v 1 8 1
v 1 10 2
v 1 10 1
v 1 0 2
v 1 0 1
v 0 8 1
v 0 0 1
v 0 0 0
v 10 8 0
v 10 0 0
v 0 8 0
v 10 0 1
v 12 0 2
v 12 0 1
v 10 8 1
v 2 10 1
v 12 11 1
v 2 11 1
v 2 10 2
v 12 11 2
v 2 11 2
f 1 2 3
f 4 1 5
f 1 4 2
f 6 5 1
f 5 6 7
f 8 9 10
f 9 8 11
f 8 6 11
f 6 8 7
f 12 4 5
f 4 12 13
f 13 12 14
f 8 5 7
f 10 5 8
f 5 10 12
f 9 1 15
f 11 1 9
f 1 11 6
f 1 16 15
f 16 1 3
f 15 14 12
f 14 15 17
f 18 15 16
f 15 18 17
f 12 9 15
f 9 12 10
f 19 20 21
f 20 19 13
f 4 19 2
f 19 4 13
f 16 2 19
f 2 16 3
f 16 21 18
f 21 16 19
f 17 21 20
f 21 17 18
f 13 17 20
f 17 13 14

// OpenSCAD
union() {
    translate([0, 0, 0]) cube([1, 1, 1]);
    translate([0, 1, 0]) cube([1, 1, 1]);
    translate([0, 2, 0]) cube([1, 1, 1]);
    translate([0, 3, 0]) cube([1, 1, 1]);
    translate([0, 4, 0]) cube([1, 1, 1]);
    translate([0, 5, 0]) cube([1, 1, 1]);
    translate([0, 6, 0]) cube([1, 1, 1]);
    translate([0, 7, 0]) cube([1, 1, 1]);
    translate([1, 0, 0]) cube([1, 1, 1]);
    translate([1, 1, 0]) cube([1, 1, 1]);
    translate([1, 2, 0]) cube([1, 1, 1]);
    translate([1, 3, 0]) cube([1, 1, 1]);
    translate([1, 4, 0]) cube([1, 1, 1]);
    translate([1, 5, 0]) cube([1, 1, 1]);
    translate([1, 6, 0]) cube([1, 1, 1]);
    translate([1, 7, 0]) cube([1, 1, 1]);
    translate([2, 0, 0]) cube([1, 1, 1]);
    translate([2, 1, 0]) cube([1, 1, 1]);
    translate([2, 2, 0]) cube([1, 1, 1]);
    translate([2, 3, 0]) cube([1, 1, 1]);
    translate([2, 4, 0]) cube([1, 1, 1]);
    translate([2, 5, 0]) cube([1, 1, 1]);
    translate([2, 6, 0]) cube([1, 1, 1]);
    translate([2, 7, 0]) cube([1, 1, 1]);
    translate([3, 0, 0]) cube([1, 1, 1]);
    translate([3, 1, 0]) cube([1, 1, 1]);
    translate([3, 2, 0]) cube([1, 1, 1]);
    translate([3, 3, 0]) cube([1, 1, 1]);
    translate([3, 4, 0]) cube([1, 1, 1]);
    translate([3, 5, 0]) cube([1, 1, 1]);
    translate([3, 6, 0]) cube([1, 1, 1]);
    translate([3, 7, 0]) cube([1, 1, 1]);
    translate([4, 0, 0]) cube([1, 1, 1]);
    translate([4, 1, 0]) cube([1, 1, 1]);
    translate([4, 2, 0]) cube([1, 1, 1]);
    translate([4, 3, 0]) cube([1, 1, 1]);
    translate([4, 4, 0]) cube([1, 1, 1]);
    translate([4, 5, 0]) cube([1, 1, 1]);
    translate([4, 6, 0]) cube([1, 1, 1]);
    translate([4, 7, 0]) cube([1, 1, 1]);
    translate([5, 0, 0]) cube([1, 1, 1]);
    translate([5, 1, 0]) cube([1, 1, 1]);
    translate([5, 2, 0]) cube([1, 1, 1]);
    translate([5, 3, 0]) cube([1, 1, 1]);
    translate([5, 4, 0]) cube([1, 1, 1]);
    translate([5, 5, 0]) cube([1, 1, 1]);
    translate([5, 6, 0]) cube([1, 1, 1]);
    translate([5, 7, 0]) cube([1, 1, 1]);
    translate([6, 0, 0]) cube([1, 1, 1]);
    translate([6, 1, 0]) cube([1, 1, 1]);
    translate([6, 2, 0]) cube([1, 1, 1]);
    translate([6, 3, 0]) cube([1, 1, 1]);
    translate([6, 4, 0]) cube([1, 1, 1]);
    translate([6, 5, 0]) cube([1, 1, 1]);
    translate([6, 6, 0]) cube([1, 1, 1]);
    translate([6, 7, 0]) cube([1, 1, 1]);
    translate([7, 0, 0]) cube([1, 1, 1]);
    translate([7, 1, 0]) cube([1, 1, 1]);
    translate([7, 2, 0]) cube([1, 1, 1]);
    translate([7, 3, 0]) cube([1, 1, 1]);
    translate([7, 4, 0]) cube([1, 1, 1]);
    translate([7, 5, 0]) cube([1, 1, 1]);
    translate([7, 6, 0]) cube([1, 1, 1]);
    translate([7, 7, 0]) cube([1, 1, 1]);
    translate([8, 0, 0]) cube([1, 1, 1]);
    translate([8, 1, 0]) cube([1, 1, 1]);
    translate([8, 2, 0]) cube([1, 1, 1]);
    translate([8, 3, 0]) cube([1, 1, 1]);
    translate([8, 4, 0]) cube([1, 1, 1]);
    translate([8, 5, 0]) cube([1, 1, 1]);
    translate([8, 6, 0]) cube([1, 1, 1]);
    translate([8, 7, 0]) cube([1, 1, 1]);
    translate([9, 0, 0]) cube([1, 1, 1]);
    translate([9, 1, 0]) cube([1, 1, 1]);
    translate([9, 2, 0]) cube([1, 1, 1]);
    translate([9, 3, 0]) cube([1, 1, 1]);
    translate([9, 4, 0]) cube([1, 1, 1]);
    translate([9, 5, 0]) cube([1, 1, 1]);
    translate([9, 6, 0]) cube([1, 1, 1]);
    translate([9, 7, 0]) cube([1, 1, 1]);
    translate([1, 0, 1]) cube([1, 1, 1]);
    translate([1, 1, 1]) cube([1, 1, 1]);
    translate([1, 2, 1]) cube([1, 1, 1]);
    translate([1, 3, 1]) cube([1, 1, 1]);
    translate([1, 4, 1]) cube([1, 1, 1]);
    translate([1, 5, 1]) cube([1, 1, 1]);
    translate([1, 6, 1]) cube([1, 1, 1]);
    translate([1, 7, 1]) cube([1, 1, 1]);
    translate([1, 8, 1]) cube([1, 1, 1]);
    translate([1, 9, 1]) cube([1, 1, 1]);
    translate([2, 0, 1]) cube([1, 1, 1]);
    translate([2, 1, 1]) cube([1, 1, 1]);
    translate([2, 2, 1]) cube([1, 1, 1]);
    translate([2, 3, 1]) cube([1, 1, 1]);
    translate([2, 4, 1]) cube([1, 1, 1]);
    translate([2, 5, 1]) cube([1, 1, 1]);
    translate([2, 6, 1]) cube([1, 1, 1]);
    translate([2, 7, 1]) cube([1, 1, 1]);
    translate([2, 8, 1]) cube([1, 1, 1]);
    translate([2, 9, 1]) cube([1, 1, 1]);
    translate([2, 10, 1]) cube([1, 1, 1]);
    translate([3, 0, 1]) cube([1, 1, 1]);
    translate([3, 1, 1]) cube([1, 1, 1]);
    translate([3, 2, 1]) cube([1, 1, 1]);
    translate([3, 3, 1]) cube([1, 1, 1]);
    translate([3, 4, 1]) cube([1, 1, 1]);
    translate([3, 5, 1]) cube([1, 1, 1]);
    translate([3, 6, 1]) cube([1, 1, 1]);
    translate([3, 7, 1]) cube([1, 1, 1]);
    translate([3, 8, 1]) cube([1, 1, 1]);
    translate([3, 9, 1]) cube([1, 1, 1]);
    translate([3, 10, 1]) cube([1, 1, 1]);
    translate([4, 0, 1]) cube([1, 1, 1]);
    translate([4, 1, 1]) cube([1, 1, 1]);
    translate([4, 2, 1]) cube([1, 1, 1]);
    translate([4, 3, 1]) cube([1, 1, 1]);
    translate([4, 4, 1]) cube([1, 1, 1]);
    translate([4, 5, 1]) cube([1, 1, 1]);
    translate([4, 6, 1]) cube([1, 1, 1]);
    translate([4, 7, 1]) cube([1, 1, 1]);
    translate([4, 8, 1]) cube([1, 1, 1]);
    translate([4, 9, 1]) cube([1, 1, 1]);
    translate([4, 10, 1]) cube([1, 1, 1]);
    translate([5, 0, 1]) cube([1, 1, 1]);
    translate([5, 1, 1]) cube([1, 1, 1]);
    translate([5, 2, 1]) cube([1, 1, 1]);
    translate([5, 3, 1]) cube([1, 1, 1]);
    translate([5, 4, 1]) cube([1, 1, 1]);
    translate([5, 5, 1]) cube([1, 1, 1]);
    translate([5, 6, 1]) cube([1, 1, 1]);
    translate([5, 7, 1]) cube([1, 1, 1]);
    translate([5, 8, 1]) cube([1, 1, 1]);
    translate([5, 9, 1]) cube([1, 1, 1]);
    translate([5, 10, 1]) cube([1, 1, 1]);
    translate([6, 0, 1]) cube([1, 1, 1]);
    translate([6, 1, 1]) cube([1, 1, 1]);
    translate([6, 2, 1]) cube([1, 1, 1]);
    translate([6, 3, 1]) cube([1, 1, 1]);
    translate([6, 4, 1]) cube([1, 1, 1]);
    translate([6, 5, 1]) cube([1, 1, 1]);
    translate([6, 6, 1]) cube([1, 1, 1]);
    translate([6, 7, 1]) cube([1, 1, 1]);
    translate([6, 8, 1]) cube([1, 1, 1]);
    translate([6, 9, 1]) cube([1, 1, 1]);
    translate([6, 10, 1]) cube([1, 1, 1]);
    translate([7, 0, 1]) cube([1, 1, 1]);
    translate([7, 1, 1]) cube([1, 1, 1]);
    translate([7, 2, 1]) cube([1, 1, 1]);
    translate([7, 3, 1]) cube([1, 1, 1]);
    translate([7, 4, 1]) cube([1, 1, 1]);
    translate([7, 5, 1]) cube([1, 1, 1]);
    translate([7, 6, 1]) cube([1, 1, 1]);
    translate([7, 7, 1]) cube([1, 1, 1]);
    translate([7, 8, 1]) cube([1, 1, 1]);
    translate([7, 9, 1]) cube([1, 1, 1]);
    translate([7, 10, 1]) cube([1, 1, 1]);
    translate([8, 0, 1]) cube([1, 1, 1]);
    translate([8, 1, 1]) cube([1, 1, 1]);
    translate([8, 2, 1]) cube([1, 1, 1]);
    translate([8, 3, 1]) cube([1, 1, 1]);
    translate([8, 4, 1]) cube([1, 1, 1]);
    translate([8, 5, 1]) cube([1, 1, 1]);
    translate([8, 6, 1]) cube([1, 1, 1]);
    translate([8, 7, 1]) cube([1, 1, 1]);
    translate([8, 8, 1]) cube([1, 1, 1]);
    translate([8, 9, 1]) cube([1, 1, 1]);
    translate([8, 10, 1]) cube([1, 1, 1]);
    translate([9, 0, 1]) cube([1, 1, 1]);
    translate([9, 1, 1]) cube([1, 1, 1]);
    translate([9, 2, 1]) cube([1, 1, 1]);
    translate([9, 3, 1]) cube([1, 1, 1]);
    translate([9, 4, 1]) cube([1, 1, 1]);
    translate([9, 5, 1]) cube([1, 1, 1]);
    translate([9, 6, 1]) cube([1, 1, 1]);
    translate([9, 7, 1]) cube([1, 1, 1]);
    translate([9, 8, 1]) cube([1, 1, 1]);
    translate([9, 9, 1]) cube([1, 1, 1]);
    translate([9, 10, 1]) cube([1, 1, 1]);
    translate([10, 0, 1]) cube([1, 1, 1]);
    translate([10, 1, 1]) cube([1, 1, 1]);
    translate([10, 2, 1]) cube([1, 1, 1]);
    translate([10, 3, 1]) cube([1, 1, 1]);
    translate([10, 4, 1]) cube([1, 1, 1]);
    translate([10, 5, 1]) cube([1, 1, 1]);
    translate([10, 6, 1]) cube([1, 1, 1]);
    translate([10, 7, 1]) cube([1, 1, 1]);
    translate([10, 8, 1]) cube([1, 1, 1]);
    translate([10, 9, 1]) cube([1, 1, 1]);
    translate([10, 10, 1]) cube([1, 1, 1]);
    translate([11, 0, 1]) cube([1, 1, 1]);
    translate([11, 1, 1]) cube([1, 1, 1]);
    translate([11, 2, 1]) cube([1, 1, 1]);
    translate([11, 3, 1]) cube([1, 1, 1]);
    translate([11, 4, 1]) cube([1, 1, 1]);
    translate([11, 5, 1]) cube([1, 1, 1]);
    translate([11, 6, 1]) cube([1, 1, 1]);
    translate([11, 7, 1]) cube([1, 1, 1]);
    translate([11, 8, 1]) cube([1, 1, 1]);
    translate([11, 9, 1]) cube([1, 1, 1]);
    translate([11, 10, 1]) cube([1, 1, 1]);
}
